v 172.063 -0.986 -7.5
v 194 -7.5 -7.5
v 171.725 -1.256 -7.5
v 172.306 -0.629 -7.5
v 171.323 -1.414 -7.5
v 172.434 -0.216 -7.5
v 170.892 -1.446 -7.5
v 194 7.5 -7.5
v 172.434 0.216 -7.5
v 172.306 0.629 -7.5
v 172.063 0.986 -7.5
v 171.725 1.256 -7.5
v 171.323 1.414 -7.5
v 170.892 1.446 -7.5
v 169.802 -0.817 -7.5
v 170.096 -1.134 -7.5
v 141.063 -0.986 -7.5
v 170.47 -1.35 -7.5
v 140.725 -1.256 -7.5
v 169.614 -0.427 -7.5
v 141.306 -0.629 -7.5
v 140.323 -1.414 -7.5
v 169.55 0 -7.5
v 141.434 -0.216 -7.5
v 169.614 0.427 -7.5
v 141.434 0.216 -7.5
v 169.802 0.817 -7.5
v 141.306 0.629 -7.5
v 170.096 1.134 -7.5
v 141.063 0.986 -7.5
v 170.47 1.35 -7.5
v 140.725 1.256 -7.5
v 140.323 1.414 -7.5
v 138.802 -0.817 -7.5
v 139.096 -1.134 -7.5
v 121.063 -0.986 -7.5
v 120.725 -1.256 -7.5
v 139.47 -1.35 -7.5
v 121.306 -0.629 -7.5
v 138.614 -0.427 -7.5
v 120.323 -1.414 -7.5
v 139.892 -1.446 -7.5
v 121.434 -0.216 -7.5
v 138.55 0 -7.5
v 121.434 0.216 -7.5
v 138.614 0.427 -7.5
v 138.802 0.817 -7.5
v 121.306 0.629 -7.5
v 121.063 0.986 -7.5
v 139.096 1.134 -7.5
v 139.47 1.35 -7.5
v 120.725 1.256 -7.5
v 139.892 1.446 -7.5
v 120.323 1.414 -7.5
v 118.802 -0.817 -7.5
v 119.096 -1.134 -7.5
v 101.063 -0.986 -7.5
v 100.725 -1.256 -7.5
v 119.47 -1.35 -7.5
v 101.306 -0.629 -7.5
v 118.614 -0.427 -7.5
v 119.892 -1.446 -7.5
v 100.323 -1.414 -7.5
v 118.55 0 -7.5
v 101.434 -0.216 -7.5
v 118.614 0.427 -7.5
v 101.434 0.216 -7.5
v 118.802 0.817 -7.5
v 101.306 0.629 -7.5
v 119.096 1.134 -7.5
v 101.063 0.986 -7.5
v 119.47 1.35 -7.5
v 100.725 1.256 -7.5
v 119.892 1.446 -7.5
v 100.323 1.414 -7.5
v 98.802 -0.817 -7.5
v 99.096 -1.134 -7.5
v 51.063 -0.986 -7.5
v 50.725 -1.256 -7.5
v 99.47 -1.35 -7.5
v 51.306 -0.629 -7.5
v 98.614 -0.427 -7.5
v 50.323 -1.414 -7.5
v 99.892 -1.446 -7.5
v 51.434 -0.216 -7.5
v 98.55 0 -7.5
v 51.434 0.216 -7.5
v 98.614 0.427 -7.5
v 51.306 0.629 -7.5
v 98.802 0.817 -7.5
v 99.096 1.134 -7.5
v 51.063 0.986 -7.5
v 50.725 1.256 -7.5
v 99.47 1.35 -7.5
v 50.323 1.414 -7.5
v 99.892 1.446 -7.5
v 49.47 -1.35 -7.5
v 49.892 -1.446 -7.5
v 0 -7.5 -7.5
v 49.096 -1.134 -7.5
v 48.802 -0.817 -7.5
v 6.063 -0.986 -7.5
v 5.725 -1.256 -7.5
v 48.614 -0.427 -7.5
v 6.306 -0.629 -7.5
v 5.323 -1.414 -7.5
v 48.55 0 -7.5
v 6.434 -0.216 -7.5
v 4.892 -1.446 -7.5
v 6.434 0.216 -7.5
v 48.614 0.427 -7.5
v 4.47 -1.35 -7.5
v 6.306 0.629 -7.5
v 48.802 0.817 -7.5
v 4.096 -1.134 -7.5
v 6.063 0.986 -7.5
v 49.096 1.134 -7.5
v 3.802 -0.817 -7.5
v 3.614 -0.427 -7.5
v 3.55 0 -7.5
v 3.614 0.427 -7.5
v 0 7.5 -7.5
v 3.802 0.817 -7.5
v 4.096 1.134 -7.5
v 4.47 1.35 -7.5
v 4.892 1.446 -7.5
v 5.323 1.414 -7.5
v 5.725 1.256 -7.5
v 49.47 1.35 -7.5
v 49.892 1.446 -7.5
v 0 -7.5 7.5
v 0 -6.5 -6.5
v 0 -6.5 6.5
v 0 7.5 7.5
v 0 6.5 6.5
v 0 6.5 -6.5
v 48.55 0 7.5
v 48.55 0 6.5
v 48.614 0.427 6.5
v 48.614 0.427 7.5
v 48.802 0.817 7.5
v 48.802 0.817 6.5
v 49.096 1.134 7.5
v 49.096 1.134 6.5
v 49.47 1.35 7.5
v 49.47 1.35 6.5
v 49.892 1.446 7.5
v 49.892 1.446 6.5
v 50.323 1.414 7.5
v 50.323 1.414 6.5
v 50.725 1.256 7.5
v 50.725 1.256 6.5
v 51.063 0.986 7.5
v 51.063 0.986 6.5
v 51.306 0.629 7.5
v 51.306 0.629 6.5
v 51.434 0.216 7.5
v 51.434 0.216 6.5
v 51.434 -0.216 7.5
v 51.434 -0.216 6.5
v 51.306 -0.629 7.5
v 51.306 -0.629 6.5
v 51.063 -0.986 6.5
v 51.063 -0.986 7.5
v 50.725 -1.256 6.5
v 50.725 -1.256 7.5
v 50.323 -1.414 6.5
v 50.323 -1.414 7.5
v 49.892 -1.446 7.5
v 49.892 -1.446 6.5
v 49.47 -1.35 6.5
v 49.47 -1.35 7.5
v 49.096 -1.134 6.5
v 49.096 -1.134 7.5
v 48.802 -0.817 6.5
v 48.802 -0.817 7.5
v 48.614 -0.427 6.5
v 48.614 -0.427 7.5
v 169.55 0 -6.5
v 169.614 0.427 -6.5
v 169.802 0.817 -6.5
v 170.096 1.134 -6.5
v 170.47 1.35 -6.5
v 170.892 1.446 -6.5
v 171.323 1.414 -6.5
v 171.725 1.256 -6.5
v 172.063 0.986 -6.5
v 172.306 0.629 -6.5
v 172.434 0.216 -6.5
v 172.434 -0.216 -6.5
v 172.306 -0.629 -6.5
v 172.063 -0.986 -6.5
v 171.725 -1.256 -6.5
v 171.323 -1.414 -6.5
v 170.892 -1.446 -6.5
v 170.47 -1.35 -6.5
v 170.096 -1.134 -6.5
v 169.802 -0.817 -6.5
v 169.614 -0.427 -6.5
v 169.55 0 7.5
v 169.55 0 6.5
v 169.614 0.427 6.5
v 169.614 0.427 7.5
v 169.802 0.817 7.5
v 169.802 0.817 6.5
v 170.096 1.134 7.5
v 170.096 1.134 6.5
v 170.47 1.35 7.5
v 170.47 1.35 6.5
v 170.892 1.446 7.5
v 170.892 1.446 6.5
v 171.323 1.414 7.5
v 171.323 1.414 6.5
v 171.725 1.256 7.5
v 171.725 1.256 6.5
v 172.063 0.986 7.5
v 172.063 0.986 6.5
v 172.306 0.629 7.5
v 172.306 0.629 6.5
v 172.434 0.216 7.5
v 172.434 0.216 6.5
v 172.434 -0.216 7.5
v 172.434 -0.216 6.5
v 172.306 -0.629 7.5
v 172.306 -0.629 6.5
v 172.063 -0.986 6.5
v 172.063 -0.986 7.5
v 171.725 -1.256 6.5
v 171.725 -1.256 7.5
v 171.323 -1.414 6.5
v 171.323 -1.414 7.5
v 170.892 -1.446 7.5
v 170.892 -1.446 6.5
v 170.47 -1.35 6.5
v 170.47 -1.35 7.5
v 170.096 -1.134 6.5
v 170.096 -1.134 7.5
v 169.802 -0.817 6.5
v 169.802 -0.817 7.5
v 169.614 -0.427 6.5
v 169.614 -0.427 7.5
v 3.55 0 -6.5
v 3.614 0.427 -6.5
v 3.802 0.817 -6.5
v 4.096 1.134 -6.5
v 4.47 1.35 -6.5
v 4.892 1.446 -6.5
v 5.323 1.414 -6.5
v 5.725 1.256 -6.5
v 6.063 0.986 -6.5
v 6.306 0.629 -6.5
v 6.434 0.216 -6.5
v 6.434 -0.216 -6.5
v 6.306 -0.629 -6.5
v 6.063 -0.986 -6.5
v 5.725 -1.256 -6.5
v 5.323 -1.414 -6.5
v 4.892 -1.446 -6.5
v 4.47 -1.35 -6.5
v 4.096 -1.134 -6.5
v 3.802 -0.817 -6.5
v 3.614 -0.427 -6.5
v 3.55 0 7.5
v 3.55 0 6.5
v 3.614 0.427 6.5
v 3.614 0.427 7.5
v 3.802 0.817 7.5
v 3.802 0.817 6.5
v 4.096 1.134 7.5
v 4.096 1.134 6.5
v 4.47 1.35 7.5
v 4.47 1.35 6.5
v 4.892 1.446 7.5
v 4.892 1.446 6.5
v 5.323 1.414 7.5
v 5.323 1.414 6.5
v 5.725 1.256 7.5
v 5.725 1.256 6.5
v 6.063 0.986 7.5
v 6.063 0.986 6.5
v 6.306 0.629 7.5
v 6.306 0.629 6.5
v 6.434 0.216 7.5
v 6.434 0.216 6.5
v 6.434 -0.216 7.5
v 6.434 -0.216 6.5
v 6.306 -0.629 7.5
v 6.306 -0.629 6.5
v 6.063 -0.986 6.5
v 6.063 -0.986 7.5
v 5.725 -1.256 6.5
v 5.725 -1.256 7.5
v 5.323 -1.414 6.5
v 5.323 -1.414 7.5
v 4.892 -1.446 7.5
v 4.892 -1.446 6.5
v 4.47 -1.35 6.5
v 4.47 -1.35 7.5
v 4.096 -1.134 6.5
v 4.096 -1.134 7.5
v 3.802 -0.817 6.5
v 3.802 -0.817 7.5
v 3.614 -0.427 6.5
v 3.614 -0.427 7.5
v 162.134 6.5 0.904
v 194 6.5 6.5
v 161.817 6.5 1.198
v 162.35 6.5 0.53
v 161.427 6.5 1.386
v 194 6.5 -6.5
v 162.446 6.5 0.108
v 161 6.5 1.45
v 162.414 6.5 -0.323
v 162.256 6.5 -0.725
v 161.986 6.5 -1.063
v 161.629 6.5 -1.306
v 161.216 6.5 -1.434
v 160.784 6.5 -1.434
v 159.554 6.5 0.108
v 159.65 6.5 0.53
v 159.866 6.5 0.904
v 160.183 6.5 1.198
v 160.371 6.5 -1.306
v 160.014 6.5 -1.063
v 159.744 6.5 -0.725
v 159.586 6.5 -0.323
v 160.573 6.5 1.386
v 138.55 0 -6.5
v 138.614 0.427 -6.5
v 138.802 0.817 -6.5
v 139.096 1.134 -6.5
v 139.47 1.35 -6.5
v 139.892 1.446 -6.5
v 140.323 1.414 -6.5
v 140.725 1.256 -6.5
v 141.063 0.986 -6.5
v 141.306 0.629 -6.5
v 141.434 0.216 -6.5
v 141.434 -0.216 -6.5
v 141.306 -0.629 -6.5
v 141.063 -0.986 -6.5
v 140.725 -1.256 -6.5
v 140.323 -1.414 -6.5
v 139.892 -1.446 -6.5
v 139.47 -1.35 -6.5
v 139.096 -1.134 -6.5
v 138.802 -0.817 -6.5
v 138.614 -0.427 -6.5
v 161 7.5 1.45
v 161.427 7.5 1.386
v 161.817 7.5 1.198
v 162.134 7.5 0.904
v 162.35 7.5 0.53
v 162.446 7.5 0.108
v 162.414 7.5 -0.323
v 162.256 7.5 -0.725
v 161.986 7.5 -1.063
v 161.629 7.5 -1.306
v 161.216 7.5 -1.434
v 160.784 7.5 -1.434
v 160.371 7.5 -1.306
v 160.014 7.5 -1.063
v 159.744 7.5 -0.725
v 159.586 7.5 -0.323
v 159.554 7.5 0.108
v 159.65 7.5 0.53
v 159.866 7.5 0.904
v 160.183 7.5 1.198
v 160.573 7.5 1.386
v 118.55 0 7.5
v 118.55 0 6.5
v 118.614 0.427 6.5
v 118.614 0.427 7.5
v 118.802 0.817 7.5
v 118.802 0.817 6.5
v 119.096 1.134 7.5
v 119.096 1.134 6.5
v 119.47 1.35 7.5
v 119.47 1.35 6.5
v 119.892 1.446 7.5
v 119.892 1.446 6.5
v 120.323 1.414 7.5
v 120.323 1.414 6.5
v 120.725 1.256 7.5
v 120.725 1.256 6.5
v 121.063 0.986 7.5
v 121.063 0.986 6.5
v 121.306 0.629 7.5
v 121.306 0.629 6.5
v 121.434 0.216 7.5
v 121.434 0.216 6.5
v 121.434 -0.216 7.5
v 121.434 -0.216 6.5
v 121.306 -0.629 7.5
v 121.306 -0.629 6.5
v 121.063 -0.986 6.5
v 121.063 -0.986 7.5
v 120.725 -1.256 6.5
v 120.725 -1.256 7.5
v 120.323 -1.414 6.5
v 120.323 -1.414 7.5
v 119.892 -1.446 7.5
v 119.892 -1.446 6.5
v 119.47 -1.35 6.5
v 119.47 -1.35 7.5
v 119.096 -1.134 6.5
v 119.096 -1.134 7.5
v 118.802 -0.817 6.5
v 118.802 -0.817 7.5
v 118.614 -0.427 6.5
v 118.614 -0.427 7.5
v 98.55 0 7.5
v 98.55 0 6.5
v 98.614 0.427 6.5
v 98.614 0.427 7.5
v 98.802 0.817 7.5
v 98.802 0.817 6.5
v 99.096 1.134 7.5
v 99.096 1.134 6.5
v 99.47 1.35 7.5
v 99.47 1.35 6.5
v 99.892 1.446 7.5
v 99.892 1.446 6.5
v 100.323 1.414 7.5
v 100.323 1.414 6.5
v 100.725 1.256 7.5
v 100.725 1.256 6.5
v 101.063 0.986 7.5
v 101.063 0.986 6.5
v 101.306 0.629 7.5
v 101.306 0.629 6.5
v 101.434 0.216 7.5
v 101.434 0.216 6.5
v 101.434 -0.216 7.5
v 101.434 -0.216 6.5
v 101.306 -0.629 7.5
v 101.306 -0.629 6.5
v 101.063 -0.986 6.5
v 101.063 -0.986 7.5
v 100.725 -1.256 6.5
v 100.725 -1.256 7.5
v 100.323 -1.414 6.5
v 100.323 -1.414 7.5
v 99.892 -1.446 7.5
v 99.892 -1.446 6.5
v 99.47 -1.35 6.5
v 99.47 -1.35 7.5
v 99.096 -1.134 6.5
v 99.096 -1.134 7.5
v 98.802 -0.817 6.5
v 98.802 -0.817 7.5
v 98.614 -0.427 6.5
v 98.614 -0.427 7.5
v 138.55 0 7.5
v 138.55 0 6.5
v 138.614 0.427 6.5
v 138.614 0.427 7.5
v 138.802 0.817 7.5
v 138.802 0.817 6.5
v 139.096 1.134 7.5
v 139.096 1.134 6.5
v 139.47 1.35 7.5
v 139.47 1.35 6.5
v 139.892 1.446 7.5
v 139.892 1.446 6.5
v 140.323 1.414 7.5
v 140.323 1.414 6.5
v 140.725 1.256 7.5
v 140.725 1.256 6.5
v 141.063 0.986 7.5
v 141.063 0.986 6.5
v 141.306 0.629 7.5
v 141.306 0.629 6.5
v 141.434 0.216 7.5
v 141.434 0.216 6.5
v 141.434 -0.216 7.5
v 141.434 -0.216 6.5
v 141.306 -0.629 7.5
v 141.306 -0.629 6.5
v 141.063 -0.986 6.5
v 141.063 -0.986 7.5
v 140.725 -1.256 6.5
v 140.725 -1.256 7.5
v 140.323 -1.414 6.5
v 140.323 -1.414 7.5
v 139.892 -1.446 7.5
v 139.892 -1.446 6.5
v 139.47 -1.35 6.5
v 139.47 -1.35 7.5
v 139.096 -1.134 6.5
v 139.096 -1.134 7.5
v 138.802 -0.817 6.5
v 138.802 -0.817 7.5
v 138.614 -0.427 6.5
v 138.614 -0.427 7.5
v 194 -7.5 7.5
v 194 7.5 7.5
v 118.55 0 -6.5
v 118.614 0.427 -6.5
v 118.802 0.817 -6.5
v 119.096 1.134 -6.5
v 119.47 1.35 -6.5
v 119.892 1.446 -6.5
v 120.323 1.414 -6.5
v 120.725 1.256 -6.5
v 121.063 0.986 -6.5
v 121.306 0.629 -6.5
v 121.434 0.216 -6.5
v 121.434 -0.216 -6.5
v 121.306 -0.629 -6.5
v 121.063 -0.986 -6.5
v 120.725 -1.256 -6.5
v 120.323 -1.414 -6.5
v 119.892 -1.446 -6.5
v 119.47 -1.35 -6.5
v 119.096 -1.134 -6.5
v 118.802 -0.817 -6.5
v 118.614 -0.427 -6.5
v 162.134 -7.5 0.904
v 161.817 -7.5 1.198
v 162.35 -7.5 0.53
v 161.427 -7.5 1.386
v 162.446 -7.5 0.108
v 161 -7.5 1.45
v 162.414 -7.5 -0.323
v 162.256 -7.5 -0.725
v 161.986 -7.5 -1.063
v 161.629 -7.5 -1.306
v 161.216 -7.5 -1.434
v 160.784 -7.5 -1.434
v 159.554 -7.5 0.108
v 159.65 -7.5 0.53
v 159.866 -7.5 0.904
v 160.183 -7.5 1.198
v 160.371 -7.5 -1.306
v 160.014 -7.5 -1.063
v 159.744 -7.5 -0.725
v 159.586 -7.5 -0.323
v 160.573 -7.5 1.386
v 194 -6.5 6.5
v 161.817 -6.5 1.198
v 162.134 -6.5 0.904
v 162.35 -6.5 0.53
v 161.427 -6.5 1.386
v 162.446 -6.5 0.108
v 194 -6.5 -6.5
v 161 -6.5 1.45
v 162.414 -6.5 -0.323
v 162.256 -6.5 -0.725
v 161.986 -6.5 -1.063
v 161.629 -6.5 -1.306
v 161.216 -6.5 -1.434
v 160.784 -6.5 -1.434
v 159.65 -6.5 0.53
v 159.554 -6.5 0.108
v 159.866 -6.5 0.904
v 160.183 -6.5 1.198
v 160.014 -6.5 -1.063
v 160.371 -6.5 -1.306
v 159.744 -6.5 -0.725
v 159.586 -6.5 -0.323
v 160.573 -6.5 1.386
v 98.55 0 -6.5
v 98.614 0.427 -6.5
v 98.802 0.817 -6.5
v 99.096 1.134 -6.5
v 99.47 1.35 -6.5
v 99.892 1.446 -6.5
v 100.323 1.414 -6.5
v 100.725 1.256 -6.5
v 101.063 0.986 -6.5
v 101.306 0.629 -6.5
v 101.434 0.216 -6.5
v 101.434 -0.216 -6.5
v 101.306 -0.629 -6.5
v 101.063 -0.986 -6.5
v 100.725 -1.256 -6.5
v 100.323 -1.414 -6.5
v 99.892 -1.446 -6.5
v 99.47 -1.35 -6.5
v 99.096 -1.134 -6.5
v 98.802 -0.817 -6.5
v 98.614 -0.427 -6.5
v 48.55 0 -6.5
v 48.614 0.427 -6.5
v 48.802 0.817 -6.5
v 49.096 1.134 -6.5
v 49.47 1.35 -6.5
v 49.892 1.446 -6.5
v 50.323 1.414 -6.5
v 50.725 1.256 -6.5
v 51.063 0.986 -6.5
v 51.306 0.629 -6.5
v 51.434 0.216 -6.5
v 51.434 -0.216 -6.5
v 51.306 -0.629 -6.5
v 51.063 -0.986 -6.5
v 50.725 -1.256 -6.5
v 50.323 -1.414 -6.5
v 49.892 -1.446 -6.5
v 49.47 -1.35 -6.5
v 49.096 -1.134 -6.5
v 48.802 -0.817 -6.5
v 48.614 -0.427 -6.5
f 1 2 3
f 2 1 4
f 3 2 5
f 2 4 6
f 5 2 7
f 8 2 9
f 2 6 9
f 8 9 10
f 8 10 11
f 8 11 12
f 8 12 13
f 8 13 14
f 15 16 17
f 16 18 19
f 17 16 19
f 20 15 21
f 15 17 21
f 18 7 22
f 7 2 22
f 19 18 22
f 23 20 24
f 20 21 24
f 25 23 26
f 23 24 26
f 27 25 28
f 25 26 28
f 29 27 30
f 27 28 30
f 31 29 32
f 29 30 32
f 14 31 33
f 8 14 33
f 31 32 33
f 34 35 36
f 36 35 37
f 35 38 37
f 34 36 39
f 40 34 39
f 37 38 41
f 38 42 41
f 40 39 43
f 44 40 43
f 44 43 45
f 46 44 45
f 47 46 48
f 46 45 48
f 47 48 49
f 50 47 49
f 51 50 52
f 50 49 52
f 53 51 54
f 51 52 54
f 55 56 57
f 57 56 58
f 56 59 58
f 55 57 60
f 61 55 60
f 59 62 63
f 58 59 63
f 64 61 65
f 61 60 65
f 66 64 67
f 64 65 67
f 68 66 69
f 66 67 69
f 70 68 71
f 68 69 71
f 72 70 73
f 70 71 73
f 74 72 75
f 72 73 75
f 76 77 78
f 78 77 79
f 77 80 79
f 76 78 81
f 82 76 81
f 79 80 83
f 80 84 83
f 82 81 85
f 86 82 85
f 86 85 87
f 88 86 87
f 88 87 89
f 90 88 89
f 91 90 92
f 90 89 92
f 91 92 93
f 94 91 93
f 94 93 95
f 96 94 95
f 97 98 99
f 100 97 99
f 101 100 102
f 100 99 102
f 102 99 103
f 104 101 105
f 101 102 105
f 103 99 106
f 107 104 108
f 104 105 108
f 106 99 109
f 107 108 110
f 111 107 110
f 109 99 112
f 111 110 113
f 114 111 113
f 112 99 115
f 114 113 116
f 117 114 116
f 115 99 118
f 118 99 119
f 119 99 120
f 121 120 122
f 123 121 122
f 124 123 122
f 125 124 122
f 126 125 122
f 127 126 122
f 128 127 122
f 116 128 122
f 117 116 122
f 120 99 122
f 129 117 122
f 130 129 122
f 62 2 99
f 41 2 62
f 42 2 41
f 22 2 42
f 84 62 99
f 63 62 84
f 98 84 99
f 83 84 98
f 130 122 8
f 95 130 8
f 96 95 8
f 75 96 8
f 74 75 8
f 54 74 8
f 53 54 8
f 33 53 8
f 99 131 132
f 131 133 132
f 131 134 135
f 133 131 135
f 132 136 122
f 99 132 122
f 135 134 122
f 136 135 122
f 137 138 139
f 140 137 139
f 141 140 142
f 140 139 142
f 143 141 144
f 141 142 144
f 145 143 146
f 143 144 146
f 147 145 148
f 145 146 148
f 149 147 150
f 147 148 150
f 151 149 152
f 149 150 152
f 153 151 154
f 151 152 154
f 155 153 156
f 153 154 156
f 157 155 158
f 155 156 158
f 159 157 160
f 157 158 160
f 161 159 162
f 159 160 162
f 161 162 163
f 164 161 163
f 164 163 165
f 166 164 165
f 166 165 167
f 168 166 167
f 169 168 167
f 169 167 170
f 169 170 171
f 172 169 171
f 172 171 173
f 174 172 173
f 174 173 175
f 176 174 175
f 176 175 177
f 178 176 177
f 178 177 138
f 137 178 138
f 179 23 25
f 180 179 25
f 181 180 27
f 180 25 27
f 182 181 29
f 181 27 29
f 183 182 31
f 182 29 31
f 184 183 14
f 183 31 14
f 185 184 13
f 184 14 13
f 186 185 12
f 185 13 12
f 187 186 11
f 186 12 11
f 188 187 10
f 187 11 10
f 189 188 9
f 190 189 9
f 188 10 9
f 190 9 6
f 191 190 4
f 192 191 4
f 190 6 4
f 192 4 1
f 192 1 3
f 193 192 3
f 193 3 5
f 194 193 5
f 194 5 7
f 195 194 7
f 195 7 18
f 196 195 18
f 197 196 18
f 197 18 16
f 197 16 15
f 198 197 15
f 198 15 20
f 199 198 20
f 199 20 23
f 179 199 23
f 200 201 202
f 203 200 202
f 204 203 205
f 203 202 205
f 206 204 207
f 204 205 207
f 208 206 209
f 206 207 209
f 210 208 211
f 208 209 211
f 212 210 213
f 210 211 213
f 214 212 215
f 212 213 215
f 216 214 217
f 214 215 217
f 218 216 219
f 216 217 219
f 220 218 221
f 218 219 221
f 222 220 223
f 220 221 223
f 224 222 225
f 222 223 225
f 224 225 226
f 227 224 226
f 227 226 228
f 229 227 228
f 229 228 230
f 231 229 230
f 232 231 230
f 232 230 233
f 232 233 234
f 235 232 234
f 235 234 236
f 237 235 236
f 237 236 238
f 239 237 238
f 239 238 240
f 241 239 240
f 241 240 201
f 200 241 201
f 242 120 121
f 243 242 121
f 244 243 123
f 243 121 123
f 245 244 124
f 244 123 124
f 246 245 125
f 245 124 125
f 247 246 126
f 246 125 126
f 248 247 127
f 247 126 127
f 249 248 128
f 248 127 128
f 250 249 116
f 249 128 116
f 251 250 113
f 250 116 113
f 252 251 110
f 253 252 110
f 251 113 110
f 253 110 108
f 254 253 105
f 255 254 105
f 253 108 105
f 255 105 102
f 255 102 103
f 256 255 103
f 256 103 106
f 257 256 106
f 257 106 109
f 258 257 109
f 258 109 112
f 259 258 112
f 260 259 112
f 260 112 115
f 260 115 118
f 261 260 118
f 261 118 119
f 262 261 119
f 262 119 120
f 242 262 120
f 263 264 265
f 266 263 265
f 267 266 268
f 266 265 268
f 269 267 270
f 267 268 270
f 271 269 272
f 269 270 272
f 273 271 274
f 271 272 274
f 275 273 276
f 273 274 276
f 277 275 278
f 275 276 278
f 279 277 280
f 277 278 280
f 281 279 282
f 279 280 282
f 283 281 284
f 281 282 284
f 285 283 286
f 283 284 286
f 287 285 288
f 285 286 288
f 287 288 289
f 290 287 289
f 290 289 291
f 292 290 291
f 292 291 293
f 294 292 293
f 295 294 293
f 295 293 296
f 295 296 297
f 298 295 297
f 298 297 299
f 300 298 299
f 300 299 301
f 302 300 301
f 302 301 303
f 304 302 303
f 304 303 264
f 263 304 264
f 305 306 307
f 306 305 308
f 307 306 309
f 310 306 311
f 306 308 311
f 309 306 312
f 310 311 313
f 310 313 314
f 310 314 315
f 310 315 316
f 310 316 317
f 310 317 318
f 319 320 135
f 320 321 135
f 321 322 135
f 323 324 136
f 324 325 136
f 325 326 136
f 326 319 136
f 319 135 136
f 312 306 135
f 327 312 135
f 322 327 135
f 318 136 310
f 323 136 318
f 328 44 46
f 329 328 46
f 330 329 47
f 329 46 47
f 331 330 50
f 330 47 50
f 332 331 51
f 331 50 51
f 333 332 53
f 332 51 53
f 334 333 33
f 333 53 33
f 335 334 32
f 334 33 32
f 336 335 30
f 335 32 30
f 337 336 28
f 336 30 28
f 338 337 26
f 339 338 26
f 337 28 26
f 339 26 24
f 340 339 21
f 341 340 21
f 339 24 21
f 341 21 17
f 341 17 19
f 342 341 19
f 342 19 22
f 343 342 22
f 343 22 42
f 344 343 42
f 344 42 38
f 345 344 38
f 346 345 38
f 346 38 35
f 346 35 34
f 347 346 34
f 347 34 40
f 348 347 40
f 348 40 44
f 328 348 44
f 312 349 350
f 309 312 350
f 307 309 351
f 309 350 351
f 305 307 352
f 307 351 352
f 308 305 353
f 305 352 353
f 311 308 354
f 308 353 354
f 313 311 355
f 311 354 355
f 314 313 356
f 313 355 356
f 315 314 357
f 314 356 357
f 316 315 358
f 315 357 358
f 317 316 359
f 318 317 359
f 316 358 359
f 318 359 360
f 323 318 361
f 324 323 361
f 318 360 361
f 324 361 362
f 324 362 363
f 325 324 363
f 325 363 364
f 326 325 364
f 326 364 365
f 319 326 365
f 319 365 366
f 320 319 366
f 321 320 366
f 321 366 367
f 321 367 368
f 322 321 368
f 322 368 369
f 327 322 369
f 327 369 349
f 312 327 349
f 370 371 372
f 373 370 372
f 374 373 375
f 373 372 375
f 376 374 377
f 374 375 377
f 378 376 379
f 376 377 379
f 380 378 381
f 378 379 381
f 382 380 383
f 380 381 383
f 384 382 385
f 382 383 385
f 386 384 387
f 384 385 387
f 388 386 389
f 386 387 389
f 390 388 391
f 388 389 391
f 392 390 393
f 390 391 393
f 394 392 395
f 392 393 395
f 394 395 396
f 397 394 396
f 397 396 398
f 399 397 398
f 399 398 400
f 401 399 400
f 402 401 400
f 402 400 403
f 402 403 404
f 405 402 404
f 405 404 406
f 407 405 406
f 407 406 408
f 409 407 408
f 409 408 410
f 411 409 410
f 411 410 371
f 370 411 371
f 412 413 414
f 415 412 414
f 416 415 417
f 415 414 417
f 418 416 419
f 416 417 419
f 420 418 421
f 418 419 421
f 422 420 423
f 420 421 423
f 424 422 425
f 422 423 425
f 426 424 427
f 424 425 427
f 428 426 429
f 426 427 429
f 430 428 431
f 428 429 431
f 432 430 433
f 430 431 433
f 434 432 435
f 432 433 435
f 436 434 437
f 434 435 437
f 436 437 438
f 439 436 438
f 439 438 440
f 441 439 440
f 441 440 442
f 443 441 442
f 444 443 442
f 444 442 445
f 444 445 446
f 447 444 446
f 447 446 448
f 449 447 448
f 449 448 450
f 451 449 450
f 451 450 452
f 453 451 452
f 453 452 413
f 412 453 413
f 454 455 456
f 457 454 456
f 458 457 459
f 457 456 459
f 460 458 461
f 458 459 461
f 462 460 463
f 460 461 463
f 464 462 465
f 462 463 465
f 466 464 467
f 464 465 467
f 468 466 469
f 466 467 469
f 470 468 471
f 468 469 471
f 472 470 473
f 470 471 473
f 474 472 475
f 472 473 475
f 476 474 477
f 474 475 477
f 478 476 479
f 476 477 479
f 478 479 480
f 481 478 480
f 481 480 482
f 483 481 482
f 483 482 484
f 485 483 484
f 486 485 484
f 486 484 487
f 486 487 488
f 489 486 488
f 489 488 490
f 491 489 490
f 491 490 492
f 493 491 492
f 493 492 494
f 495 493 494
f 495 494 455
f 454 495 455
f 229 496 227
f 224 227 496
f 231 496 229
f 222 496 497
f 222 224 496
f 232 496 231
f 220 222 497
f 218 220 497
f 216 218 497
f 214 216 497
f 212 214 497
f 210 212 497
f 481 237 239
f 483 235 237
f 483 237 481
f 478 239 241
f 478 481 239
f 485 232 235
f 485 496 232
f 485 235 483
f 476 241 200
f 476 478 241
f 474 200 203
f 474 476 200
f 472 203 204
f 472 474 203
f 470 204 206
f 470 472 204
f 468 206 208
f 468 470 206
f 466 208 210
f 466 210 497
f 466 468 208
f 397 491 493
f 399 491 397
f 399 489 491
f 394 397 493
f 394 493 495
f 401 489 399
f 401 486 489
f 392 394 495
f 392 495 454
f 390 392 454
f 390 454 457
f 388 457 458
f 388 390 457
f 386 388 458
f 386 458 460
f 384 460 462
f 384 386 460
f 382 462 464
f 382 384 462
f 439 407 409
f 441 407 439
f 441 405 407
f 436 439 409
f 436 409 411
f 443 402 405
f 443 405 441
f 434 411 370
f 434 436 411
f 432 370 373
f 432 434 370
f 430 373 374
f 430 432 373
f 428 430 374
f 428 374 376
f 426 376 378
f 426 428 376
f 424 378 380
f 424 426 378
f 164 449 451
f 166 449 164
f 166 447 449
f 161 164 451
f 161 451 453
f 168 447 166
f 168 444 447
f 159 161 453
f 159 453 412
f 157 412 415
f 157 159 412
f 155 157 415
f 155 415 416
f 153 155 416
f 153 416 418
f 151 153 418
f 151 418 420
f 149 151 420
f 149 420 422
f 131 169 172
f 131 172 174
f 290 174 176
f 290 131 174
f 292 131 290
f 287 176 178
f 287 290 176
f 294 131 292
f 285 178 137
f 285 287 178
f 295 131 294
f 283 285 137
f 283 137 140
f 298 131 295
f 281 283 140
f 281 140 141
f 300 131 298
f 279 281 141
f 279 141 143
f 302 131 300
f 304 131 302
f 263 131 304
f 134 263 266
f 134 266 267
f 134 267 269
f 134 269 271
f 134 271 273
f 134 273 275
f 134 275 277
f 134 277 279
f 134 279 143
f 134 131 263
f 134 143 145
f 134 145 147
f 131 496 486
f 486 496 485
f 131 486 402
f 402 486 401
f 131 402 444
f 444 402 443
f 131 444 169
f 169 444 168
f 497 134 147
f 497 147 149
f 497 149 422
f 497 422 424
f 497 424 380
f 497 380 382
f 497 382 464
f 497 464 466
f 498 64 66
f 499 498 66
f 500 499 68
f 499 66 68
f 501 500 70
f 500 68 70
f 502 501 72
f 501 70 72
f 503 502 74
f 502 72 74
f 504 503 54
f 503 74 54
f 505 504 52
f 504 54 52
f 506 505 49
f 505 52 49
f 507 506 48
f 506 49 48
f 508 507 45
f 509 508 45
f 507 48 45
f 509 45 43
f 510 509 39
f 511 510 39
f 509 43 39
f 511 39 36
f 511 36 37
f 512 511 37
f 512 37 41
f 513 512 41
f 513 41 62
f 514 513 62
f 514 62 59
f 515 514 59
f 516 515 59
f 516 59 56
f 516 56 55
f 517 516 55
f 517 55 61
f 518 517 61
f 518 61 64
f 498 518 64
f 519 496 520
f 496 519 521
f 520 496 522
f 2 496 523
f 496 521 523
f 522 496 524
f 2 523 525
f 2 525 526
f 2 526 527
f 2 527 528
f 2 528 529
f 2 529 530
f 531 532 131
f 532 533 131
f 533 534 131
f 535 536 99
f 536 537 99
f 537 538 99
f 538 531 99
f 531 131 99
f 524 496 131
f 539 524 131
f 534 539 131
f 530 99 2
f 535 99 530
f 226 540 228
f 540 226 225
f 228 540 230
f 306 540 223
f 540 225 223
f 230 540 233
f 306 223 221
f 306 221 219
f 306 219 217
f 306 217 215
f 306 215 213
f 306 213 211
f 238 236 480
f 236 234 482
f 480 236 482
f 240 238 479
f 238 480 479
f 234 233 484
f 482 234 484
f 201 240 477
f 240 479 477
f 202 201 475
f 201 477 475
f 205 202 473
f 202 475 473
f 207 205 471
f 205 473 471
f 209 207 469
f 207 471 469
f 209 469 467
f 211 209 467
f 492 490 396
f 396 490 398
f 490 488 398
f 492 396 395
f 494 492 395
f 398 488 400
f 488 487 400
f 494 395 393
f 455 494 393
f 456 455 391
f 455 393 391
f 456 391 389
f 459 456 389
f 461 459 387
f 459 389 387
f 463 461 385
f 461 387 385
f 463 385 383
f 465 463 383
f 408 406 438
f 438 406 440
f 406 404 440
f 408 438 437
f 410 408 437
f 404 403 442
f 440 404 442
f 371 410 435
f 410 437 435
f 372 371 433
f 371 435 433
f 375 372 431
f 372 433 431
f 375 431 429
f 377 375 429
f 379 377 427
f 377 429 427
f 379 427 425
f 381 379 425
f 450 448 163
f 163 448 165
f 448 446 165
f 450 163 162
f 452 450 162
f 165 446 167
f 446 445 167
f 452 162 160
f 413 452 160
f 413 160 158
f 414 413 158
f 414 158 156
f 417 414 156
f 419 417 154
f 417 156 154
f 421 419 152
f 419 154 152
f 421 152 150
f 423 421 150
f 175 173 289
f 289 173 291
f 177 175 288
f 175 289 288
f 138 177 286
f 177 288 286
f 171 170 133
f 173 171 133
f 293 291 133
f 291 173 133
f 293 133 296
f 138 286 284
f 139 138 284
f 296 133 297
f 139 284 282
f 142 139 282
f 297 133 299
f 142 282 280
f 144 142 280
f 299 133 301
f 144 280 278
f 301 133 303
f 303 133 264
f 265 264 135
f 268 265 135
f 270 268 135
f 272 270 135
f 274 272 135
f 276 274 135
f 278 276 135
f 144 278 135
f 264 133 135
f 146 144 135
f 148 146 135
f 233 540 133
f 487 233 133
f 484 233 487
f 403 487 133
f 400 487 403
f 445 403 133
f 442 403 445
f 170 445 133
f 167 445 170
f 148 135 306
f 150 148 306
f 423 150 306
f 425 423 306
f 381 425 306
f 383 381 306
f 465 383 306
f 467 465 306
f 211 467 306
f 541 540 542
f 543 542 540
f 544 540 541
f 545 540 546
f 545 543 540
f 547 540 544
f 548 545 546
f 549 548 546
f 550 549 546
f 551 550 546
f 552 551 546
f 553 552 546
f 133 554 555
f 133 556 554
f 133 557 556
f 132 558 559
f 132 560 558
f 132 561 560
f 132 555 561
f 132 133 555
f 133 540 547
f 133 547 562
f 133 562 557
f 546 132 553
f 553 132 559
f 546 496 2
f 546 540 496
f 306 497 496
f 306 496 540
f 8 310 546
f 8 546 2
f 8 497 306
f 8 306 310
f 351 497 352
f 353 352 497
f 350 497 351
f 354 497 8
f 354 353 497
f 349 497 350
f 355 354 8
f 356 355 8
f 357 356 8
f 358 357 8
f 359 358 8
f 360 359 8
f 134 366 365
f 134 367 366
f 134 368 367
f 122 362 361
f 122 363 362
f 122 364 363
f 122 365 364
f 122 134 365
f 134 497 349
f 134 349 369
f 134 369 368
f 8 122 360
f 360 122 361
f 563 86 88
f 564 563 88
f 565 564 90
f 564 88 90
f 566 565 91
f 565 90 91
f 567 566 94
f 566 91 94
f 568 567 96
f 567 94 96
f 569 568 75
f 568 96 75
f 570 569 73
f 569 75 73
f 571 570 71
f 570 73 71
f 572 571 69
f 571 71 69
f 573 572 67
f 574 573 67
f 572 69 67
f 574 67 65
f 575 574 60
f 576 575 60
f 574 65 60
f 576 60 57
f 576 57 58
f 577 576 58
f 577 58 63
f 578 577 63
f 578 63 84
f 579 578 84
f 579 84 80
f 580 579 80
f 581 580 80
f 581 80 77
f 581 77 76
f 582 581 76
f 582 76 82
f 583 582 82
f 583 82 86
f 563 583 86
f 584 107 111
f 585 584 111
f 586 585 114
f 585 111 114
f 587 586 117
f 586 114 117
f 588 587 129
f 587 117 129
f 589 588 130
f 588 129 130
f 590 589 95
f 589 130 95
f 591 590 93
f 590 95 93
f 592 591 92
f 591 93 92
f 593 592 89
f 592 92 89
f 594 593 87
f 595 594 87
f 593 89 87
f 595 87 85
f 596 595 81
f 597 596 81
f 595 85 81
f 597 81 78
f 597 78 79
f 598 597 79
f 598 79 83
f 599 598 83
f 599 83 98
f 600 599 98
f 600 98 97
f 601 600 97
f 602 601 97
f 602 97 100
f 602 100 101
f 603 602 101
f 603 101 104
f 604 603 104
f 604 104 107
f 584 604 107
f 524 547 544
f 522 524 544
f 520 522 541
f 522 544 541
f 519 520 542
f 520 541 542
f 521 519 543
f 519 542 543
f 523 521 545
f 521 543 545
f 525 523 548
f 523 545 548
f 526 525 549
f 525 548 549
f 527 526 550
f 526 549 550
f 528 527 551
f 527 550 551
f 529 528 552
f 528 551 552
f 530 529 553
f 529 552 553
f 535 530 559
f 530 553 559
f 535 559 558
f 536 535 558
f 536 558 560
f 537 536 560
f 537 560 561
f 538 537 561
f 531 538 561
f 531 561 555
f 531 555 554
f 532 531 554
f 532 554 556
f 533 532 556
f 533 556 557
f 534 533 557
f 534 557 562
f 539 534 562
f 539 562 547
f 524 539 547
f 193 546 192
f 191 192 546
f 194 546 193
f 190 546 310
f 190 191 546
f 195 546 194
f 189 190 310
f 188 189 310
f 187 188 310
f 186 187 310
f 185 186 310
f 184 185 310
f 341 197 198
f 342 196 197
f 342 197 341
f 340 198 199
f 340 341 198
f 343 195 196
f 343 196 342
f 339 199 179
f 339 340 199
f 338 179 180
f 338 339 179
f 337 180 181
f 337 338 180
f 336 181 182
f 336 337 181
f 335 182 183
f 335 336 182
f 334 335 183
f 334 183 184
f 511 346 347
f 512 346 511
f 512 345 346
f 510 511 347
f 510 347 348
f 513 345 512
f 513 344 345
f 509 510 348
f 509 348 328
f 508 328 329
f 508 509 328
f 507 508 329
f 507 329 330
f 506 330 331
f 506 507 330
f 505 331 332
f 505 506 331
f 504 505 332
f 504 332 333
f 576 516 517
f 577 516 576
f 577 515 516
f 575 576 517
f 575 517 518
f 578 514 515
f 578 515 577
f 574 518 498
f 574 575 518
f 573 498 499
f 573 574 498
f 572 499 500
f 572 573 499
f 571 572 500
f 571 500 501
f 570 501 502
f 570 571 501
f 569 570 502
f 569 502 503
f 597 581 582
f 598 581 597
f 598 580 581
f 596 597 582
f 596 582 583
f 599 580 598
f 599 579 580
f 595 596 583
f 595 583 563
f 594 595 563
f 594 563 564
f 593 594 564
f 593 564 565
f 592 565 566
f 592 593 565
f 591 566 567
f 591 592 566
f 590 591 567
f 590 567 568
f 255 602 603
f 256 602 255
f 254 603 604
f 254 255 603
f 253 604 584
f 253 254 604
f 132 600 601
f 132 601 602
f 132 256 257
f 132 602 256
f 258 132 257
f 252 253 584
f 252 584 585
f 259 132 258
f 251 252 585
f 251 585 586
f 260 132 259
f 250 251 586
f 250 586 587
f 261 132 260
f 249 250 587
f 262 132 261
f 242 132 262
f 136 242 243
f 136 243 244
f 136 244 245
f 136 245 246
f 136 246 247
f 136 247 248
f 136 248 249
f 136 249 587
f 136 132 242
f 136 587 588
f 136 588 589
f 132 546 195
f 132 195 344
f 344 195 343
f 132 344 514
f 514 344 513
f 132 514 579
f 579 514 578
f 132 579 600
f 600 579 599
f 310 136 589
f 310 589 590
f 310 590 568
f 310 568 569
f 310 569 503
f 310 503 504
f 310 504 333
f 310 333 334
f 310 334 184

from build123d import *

# Parameters (mm, degrees)
SKETCH_11_W         = 15
SKETCH_11_H         = 15
SKETCH_11_W_2       = 13
SKETCH_11_H_2       = 13
F_15X15X1_1_DEPTH   = 194
SKETCH_12_R         = 1.45
CUT_EXTRUDE_1_DEPTH = 195.723521948
SKETCH_13_R         = 1.45
CUT_EXTRUDE_2_DEPTH = 195.723521948
SKETCH_14_R         = 1.45
CUT_EXTRUDE_3_DEPTH = 195.723521948
SKETCH_15_R         = 1.45
CUT_EXTRUDE_4_DEPTH = 195.723521948


with BuildPart() as part:
    # 草图11 → 铝管 15X15X1(1) (new body)
    with BuildSketch(Plane(origin=(0, 0, 0), x_dir=(0, 0, -1), z_dir=(1, 0, 0))):
        Rectangle(SKETCH_11_W, SKETCH_11_H)
        Rectangle(SKETCH_11_W_2, SKETCH_11_H_2, mode=Mode.SUBTRACT)
    extrude(amount=F_15X15X1_1_DEPTH)

    # 草图12 → 切除-拉伸1 (cut, through all)
    with BuildSketch(Plane(origin=(0, 0, -7.5), x_dir=(-1, 0, 0), z_dir=(0, 0, -1))):
        with Locations((-5, 0)):
            Circle(SKETCH_12_R)
        with Locations((-50, 0)):
            Circle(SKETCH_12_R)
    extrude(amount=-CUT_EXTRUDE_1_DEPTH, mode=Mode.SUBTRACT)

    # 草图13 → 切除-拉伸2 (cut, through all)
    with BuildSketch(Plane(origin=(0, 0, -7.5), x_dir=(-1, 0, 0), z_dir=(0, 0, -1))):
        with Locations((-171, 0)):
            Circle(SKETCH_13_R)
    extrude(amount=-CUT_EXTRUDE_2_DEPTH, mode=Mode.SUBTRACT)

    # 草图14 → 切除-拉伸3 (cut, through all)
    with BuildSketch(Plane(origin=(0, 7.5, 0), x_dir=(1, 0, 0), z_dir=(0, 1, 0))):
        with Locations(Location((161, 0, 0), (0, 0, 270))):
            Circle(SKETCH_14_R)
    extrude(amount=-CUT_EXTRUDE_3_DEPTH, mode=Mode.SUBTRACT)

    # 草图15 → 切除-拉伸4 (cut, through all)
    with BuildSketch(Plane(origin=(0, 0, -7.5), x_dir=(-1, 0, 0), z_dir=(0, 0, -1))):
        with Locations((-120, 0)):
            Circle(SKETCH_15_R)
        with Locations((-140, 0)):
            Circle(SKETCH_15_R)
        with Locations((-100, 0)):
            Circle(SKETCH_15_R)
    extrude(amount=-CUT_EXTRUDE_4_DEPTH, mode=Mode.SUBTRACT)


solid = part.part
